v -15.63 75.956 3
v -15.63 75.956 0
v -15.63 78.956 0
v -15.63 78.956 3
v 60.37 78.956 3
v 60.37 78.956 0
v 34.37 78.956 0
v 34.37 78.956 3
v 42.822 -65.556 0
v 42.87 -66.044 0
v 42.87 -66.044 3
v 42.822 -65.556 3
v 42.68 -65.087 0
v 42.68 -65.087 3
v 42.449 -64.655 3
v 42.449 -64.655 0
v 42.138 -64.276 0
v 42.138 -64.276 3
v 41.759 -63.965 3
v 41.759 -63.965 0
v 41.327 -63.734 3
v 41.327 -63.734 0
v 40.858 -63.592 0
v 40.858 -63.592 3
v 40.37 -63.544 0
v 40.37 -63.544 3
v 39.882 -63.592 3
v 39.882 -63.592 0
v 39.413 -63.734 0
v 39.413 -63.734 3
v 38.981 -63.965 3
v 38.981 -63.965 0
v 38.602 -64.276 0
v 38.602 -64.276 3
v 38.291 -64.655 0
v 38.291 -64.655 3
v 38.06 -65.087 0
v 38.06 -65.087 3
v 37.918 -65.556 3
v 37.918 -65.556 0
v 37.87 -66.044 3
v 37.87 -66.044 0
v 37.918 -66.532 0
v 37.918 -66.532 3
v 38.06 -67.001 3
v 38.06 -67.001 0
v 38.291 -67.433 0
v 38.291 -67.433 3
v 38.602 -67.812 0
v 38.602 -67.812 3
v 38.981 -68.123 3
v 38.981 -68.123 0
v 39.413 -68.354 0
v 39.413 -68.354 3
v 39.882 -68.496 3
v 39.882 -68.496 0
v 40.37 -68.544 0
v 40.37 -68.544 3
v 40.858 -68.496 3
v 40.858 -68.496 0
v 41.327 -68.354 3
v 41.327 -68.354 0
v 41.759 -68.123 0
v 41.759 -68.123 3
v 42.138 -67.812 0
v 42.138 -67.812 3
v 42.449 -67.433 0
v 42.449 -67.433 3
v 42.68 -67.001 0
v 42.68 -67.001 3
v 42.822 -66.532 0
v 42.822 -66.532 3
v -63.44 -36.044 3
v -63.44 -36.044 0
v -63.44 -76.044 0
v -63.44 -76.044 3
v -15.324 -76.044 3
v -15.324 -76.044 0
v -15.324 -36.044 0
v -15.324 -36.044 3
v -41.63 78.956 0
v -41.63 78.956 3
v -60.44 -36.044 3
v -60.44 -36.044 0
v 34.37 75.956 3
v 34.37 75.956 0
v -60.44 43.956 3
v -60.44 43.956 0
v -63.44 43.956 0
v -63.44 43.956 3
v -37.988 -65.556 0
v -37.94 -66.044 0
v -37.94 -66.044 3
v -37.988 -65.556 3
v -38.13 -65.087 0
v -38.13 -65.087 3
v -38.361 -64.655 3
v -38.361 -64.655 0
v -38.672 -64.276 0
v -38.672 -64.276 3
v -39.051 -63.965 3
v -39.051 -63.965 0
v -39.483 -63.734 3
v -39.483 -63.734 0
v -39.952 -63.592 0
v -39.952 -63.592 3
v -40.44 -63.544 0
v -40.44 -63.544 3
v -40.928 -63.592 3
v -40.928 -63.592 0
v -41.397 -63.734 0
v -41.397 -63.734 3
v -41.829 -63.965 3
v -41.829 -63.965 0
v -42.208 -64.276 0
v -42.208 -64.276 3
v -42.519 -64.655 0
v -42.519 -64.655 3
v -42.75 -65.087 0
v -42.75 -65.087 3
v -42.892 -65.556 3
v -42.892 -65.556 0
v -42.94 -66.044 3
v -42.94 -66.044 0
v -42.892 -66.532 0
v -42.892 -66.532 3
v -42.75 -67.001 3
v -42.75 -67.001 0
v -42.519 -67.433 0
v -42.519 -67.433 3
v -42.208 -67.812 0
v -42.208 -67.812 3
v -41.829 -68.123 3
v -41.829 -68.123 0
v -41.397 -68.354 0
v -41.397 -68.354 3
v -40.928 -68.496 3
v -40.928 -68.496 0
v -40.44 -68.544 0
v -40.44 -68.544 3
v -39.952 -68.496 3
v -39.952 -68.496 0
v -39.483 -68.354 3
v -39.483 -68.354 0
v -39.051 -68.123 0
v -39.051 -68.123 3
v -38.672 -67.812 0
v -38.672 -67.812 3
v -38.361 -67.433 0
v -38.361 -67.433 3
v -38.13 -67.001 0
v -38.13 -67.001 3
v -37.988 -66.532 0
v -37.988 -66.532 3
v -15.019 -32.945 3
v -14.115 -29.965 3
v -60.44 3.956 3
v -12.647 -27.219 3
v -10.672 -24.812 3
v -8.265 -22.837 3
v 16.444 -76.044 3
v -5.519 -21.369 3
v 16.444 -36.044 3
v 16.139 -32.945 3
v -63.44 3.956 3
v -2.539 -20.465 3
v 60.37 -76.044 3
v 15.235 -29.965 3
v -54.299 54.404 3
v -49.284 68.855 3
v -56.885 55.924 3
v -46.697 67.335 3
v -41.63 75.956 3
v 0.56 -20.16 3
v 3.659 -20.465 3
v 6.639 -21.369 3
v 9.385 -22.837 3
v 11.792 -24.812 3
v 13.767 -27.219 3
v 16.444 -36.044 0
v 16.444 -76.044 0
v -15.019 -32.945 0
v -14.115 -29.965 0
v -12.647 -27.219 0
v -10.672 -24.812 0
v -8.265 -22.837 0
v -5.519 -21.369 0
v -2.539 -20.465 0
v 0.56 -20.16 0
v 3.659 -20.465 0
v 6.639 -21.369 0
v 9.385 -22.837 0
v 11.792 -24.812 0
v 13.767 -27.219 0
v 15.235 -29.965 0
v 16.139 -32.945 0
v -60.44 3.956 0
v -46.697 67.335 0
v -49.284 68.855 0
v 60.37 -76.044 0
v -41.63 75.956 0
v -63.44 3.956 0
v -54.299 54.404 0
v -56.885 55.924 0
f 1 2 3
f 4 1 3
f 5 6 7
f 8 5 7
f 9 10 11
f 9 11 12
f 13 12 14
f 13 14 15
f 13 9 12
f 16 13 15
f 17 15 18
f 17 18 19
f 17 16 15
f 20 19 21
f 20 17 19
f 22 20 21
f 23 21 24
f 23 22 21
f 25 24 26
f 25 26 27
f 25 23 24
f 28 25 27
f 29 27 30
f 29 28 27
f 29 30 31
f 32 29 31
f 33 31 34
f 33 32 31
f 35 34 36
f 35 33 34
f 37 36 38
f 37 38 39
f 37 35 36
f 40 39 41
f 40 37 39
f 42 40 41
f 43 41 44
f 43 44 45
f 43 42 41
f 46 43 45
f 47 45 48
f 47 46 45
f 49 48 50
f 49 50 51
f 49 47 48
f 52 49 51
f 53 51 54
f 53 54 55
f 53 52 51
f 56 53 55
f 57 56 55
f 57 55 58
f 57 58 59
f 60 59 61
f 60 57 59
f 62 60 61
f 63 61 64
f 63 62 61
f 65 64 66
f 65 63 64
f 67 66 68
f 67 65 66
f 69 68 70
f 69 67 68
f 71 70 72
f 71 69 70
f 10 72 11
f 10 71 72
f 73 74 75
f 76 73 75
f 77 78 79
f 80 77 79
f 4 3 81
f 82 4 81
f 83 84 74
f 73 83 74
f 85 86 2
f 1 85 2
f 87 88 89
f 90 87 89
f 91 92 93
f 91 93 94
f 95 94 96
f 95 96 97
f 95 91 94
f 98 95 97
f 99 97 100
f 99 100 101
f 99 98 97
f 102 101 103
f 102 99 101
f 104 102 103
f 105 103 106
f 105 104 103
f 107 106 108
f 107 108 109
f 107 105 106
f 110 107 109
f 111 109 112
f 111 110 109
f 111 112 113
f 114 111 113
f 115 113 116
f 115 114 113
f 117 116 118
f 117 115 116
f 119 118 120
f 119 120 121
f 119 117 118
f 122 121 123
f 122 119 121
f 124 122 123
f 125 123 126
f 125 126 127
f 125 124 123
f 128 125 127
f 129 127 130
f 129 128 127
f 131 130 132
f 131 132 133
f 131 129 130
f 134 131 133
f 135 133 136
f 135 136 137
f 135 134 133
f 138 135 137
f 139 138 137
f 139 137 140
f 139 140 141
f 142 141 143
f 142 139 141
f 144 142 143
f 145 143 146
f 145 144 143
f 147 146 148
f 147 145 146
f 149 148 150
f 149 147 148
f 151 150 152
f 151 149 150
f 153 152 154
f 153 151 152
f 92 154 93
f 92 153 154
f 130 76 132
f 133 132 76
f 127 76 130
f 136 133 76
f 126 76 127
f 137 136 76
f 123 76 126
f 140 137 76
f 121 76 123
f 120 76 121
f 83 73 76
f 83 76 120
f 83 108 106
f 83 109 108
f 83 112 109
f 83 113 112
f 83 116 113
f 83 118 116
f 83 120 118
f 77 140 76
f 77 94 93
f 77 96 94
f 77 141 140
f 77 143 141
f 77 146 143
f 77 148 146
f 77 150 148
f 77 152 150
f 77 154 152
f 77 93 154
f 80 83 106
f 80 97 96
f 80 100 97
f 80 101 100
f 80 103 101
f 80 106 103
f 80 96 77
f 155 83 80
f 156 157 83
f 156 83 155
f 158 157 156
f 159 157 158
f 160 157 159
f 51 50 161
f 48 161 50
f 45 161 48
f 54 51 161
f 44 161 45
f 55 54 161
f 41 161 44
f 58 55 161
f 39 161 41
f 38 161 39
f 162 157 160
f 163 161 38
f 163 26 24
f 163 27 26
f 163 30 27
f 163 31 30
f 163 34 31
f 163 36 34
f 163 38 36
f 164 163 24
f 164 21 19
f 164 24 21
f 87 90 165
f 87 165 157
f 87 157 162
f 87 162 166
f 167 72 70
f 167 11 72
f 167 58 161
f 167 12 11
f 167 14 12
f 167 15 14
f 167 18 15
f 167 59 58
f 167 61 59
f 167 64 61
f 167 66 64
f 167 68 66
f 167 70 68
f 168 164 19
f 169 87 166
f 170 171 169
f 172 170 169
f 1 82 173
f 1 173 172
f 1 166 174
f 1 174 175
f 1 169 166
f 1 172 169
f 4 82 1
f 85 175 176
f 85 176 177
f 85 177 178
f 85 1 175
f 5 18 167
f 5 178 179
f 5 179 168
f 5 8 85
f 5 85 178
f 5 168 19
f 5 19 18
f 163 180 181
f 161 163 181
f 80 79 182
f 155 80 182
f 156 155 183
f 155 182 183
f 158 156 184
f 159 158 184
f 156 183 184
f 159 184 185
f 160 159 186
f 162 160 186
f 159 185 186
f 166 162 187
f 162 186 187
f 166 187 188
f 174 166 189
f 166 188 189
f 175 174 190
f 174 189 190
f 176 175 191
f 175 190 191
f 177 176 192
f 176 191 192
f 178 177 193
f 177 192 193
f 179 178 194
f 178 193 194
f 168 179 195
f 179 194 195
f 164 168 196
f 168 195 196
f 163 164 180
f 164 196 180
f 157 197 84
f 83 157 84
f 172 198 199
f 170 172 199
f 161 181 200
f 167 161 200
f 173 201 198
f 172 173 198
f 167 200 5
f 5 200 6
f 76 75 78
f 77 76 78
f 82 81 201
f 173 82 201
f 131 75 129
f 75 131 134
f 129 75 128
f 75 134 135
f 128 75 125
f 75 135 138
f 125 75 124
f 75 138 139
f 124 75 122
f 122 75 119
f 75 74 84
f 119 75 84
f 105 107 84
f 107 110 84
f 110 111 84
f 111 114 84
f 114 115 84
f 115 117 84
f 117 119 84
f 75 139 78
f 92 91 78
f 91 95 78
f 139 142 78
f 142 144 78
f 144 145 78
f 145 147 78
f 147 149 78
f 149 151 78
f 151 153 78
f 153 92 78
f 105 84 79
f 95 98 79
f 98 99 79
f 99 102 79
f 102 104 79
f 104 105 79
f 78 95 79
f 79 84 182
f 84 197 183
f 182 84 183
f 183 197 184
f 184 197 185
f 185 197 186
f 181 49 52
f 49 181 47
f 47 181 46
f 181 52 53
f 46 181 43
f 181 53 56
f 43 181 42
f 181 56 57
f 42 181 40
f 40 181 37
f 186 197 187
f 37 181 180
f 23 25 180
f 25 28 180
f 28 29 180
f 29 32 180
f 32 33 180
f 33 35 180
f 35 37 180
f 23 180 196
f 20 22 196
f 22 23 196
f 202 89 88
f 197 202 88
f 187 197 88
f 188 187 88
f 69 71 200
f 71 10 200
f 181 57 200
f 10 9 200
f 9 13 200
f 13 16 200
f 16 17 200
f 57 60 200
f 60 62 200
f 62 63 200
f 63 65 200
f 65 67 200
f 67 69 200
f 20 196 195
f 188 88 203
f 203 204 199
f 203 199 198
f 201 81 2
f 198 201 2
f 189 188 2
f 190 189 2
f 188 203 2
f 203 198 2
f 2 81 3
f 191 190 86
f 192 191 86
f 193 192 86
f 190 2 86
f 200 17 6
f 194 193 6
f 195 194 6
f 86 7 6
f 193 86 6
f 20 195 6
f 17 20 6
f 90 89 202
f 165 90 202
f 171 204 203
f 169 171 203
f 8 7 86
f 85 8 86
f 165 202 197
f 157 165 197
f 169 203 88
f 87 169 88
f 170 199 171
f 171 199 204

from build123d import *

# Parameters (mm, degrees)
SKETCH1_R           = 2.5
BOSS_EXTRUDE1_DEPTH = 3


with BuildPart() as part:
    # Sketch1 → Boss-Extrude1 (new body)
    with BuildSketch(Plane.XY):
        with BuildLine():
            Line((34.37, 75.95596391), (-15.63, 75.95596391))
            Line((-15.63, 75.95596391), (-15.63, 78.95596391))
            Line((-15.63, 78.95596391), (-41.63, 78.95596391))
            Line((-41.63, 78.95596391), (-41.63, 75.95596391))
            Line((-41.63, 75.95596391), (-46.697493122, 67.335029306))
            Line((-46.697493122, 67.335029306), (-49.283773504, 68.855277242))
            Line((-49.283773504, 68.855277242), (-56.885013187, 55.923875336))
            Line((-56.885013187, 55.923875336), (-54.298732806, 54.403627399))
            Line((-54.298732806, 54.403627399), (-60.44, 43.95596391))
            Line((-60.44, 43.95596391), (-63.44, 43.95596391))
            Line((-63.44, 43.95596391), (-63.44, 3.95596391))
            Line((-63.44, 3.95596391), (-60.44, 3.95596391))
            Line((-60.44, 3.95596391), (-60.44, -36.04403609))
            Line((-60.44, -36.04403609), (-63.44, -36.04403609))
            Line((-63.44, -36.04403609), (-63.44, -76.04403609))
            Line((-63.44, -76.04403609), (-60.44, -76.04403609))
            Line((-60.44, -76.04403609), (-15.324347337, -76.04403609))
            Line((-15.324347337, -76.04403609), (-15.324347337, -36.04403609))
            ThreePointArc((-15.324347337, -36.04403609), (0.56, -20.159688753), (16.444347337, -36.04403609))
            Line((16.444347337, -36.04403609), (16.444347337, -76.04403609))
            Line((16.444347337, -76.04403609), (60.37, -76.04403609))
            Line((60.37, -76.04403609), (60.37, 75.95596391))
            Line((60.37, 75.95596391), (60.37, 78.95596391))
            Line((60.37, 78.95596391), (34.37, 78.95596391))
            Line((34.37, 78.95596391), (34.37, 75.95596391))
        make_face()
        with Locations((-40.44, -66.04403609)):
            Circle(SKETCH1_R, mode=Mode.SUBTRACT)
        with Locations((40.37, -66.04403609)):
            Circle(SKETCH1_R, mode=Mode.SUBTRACT)
    extrude(amount=BOSS_EXTRUDE1_DEPTH)


solid = part.part
